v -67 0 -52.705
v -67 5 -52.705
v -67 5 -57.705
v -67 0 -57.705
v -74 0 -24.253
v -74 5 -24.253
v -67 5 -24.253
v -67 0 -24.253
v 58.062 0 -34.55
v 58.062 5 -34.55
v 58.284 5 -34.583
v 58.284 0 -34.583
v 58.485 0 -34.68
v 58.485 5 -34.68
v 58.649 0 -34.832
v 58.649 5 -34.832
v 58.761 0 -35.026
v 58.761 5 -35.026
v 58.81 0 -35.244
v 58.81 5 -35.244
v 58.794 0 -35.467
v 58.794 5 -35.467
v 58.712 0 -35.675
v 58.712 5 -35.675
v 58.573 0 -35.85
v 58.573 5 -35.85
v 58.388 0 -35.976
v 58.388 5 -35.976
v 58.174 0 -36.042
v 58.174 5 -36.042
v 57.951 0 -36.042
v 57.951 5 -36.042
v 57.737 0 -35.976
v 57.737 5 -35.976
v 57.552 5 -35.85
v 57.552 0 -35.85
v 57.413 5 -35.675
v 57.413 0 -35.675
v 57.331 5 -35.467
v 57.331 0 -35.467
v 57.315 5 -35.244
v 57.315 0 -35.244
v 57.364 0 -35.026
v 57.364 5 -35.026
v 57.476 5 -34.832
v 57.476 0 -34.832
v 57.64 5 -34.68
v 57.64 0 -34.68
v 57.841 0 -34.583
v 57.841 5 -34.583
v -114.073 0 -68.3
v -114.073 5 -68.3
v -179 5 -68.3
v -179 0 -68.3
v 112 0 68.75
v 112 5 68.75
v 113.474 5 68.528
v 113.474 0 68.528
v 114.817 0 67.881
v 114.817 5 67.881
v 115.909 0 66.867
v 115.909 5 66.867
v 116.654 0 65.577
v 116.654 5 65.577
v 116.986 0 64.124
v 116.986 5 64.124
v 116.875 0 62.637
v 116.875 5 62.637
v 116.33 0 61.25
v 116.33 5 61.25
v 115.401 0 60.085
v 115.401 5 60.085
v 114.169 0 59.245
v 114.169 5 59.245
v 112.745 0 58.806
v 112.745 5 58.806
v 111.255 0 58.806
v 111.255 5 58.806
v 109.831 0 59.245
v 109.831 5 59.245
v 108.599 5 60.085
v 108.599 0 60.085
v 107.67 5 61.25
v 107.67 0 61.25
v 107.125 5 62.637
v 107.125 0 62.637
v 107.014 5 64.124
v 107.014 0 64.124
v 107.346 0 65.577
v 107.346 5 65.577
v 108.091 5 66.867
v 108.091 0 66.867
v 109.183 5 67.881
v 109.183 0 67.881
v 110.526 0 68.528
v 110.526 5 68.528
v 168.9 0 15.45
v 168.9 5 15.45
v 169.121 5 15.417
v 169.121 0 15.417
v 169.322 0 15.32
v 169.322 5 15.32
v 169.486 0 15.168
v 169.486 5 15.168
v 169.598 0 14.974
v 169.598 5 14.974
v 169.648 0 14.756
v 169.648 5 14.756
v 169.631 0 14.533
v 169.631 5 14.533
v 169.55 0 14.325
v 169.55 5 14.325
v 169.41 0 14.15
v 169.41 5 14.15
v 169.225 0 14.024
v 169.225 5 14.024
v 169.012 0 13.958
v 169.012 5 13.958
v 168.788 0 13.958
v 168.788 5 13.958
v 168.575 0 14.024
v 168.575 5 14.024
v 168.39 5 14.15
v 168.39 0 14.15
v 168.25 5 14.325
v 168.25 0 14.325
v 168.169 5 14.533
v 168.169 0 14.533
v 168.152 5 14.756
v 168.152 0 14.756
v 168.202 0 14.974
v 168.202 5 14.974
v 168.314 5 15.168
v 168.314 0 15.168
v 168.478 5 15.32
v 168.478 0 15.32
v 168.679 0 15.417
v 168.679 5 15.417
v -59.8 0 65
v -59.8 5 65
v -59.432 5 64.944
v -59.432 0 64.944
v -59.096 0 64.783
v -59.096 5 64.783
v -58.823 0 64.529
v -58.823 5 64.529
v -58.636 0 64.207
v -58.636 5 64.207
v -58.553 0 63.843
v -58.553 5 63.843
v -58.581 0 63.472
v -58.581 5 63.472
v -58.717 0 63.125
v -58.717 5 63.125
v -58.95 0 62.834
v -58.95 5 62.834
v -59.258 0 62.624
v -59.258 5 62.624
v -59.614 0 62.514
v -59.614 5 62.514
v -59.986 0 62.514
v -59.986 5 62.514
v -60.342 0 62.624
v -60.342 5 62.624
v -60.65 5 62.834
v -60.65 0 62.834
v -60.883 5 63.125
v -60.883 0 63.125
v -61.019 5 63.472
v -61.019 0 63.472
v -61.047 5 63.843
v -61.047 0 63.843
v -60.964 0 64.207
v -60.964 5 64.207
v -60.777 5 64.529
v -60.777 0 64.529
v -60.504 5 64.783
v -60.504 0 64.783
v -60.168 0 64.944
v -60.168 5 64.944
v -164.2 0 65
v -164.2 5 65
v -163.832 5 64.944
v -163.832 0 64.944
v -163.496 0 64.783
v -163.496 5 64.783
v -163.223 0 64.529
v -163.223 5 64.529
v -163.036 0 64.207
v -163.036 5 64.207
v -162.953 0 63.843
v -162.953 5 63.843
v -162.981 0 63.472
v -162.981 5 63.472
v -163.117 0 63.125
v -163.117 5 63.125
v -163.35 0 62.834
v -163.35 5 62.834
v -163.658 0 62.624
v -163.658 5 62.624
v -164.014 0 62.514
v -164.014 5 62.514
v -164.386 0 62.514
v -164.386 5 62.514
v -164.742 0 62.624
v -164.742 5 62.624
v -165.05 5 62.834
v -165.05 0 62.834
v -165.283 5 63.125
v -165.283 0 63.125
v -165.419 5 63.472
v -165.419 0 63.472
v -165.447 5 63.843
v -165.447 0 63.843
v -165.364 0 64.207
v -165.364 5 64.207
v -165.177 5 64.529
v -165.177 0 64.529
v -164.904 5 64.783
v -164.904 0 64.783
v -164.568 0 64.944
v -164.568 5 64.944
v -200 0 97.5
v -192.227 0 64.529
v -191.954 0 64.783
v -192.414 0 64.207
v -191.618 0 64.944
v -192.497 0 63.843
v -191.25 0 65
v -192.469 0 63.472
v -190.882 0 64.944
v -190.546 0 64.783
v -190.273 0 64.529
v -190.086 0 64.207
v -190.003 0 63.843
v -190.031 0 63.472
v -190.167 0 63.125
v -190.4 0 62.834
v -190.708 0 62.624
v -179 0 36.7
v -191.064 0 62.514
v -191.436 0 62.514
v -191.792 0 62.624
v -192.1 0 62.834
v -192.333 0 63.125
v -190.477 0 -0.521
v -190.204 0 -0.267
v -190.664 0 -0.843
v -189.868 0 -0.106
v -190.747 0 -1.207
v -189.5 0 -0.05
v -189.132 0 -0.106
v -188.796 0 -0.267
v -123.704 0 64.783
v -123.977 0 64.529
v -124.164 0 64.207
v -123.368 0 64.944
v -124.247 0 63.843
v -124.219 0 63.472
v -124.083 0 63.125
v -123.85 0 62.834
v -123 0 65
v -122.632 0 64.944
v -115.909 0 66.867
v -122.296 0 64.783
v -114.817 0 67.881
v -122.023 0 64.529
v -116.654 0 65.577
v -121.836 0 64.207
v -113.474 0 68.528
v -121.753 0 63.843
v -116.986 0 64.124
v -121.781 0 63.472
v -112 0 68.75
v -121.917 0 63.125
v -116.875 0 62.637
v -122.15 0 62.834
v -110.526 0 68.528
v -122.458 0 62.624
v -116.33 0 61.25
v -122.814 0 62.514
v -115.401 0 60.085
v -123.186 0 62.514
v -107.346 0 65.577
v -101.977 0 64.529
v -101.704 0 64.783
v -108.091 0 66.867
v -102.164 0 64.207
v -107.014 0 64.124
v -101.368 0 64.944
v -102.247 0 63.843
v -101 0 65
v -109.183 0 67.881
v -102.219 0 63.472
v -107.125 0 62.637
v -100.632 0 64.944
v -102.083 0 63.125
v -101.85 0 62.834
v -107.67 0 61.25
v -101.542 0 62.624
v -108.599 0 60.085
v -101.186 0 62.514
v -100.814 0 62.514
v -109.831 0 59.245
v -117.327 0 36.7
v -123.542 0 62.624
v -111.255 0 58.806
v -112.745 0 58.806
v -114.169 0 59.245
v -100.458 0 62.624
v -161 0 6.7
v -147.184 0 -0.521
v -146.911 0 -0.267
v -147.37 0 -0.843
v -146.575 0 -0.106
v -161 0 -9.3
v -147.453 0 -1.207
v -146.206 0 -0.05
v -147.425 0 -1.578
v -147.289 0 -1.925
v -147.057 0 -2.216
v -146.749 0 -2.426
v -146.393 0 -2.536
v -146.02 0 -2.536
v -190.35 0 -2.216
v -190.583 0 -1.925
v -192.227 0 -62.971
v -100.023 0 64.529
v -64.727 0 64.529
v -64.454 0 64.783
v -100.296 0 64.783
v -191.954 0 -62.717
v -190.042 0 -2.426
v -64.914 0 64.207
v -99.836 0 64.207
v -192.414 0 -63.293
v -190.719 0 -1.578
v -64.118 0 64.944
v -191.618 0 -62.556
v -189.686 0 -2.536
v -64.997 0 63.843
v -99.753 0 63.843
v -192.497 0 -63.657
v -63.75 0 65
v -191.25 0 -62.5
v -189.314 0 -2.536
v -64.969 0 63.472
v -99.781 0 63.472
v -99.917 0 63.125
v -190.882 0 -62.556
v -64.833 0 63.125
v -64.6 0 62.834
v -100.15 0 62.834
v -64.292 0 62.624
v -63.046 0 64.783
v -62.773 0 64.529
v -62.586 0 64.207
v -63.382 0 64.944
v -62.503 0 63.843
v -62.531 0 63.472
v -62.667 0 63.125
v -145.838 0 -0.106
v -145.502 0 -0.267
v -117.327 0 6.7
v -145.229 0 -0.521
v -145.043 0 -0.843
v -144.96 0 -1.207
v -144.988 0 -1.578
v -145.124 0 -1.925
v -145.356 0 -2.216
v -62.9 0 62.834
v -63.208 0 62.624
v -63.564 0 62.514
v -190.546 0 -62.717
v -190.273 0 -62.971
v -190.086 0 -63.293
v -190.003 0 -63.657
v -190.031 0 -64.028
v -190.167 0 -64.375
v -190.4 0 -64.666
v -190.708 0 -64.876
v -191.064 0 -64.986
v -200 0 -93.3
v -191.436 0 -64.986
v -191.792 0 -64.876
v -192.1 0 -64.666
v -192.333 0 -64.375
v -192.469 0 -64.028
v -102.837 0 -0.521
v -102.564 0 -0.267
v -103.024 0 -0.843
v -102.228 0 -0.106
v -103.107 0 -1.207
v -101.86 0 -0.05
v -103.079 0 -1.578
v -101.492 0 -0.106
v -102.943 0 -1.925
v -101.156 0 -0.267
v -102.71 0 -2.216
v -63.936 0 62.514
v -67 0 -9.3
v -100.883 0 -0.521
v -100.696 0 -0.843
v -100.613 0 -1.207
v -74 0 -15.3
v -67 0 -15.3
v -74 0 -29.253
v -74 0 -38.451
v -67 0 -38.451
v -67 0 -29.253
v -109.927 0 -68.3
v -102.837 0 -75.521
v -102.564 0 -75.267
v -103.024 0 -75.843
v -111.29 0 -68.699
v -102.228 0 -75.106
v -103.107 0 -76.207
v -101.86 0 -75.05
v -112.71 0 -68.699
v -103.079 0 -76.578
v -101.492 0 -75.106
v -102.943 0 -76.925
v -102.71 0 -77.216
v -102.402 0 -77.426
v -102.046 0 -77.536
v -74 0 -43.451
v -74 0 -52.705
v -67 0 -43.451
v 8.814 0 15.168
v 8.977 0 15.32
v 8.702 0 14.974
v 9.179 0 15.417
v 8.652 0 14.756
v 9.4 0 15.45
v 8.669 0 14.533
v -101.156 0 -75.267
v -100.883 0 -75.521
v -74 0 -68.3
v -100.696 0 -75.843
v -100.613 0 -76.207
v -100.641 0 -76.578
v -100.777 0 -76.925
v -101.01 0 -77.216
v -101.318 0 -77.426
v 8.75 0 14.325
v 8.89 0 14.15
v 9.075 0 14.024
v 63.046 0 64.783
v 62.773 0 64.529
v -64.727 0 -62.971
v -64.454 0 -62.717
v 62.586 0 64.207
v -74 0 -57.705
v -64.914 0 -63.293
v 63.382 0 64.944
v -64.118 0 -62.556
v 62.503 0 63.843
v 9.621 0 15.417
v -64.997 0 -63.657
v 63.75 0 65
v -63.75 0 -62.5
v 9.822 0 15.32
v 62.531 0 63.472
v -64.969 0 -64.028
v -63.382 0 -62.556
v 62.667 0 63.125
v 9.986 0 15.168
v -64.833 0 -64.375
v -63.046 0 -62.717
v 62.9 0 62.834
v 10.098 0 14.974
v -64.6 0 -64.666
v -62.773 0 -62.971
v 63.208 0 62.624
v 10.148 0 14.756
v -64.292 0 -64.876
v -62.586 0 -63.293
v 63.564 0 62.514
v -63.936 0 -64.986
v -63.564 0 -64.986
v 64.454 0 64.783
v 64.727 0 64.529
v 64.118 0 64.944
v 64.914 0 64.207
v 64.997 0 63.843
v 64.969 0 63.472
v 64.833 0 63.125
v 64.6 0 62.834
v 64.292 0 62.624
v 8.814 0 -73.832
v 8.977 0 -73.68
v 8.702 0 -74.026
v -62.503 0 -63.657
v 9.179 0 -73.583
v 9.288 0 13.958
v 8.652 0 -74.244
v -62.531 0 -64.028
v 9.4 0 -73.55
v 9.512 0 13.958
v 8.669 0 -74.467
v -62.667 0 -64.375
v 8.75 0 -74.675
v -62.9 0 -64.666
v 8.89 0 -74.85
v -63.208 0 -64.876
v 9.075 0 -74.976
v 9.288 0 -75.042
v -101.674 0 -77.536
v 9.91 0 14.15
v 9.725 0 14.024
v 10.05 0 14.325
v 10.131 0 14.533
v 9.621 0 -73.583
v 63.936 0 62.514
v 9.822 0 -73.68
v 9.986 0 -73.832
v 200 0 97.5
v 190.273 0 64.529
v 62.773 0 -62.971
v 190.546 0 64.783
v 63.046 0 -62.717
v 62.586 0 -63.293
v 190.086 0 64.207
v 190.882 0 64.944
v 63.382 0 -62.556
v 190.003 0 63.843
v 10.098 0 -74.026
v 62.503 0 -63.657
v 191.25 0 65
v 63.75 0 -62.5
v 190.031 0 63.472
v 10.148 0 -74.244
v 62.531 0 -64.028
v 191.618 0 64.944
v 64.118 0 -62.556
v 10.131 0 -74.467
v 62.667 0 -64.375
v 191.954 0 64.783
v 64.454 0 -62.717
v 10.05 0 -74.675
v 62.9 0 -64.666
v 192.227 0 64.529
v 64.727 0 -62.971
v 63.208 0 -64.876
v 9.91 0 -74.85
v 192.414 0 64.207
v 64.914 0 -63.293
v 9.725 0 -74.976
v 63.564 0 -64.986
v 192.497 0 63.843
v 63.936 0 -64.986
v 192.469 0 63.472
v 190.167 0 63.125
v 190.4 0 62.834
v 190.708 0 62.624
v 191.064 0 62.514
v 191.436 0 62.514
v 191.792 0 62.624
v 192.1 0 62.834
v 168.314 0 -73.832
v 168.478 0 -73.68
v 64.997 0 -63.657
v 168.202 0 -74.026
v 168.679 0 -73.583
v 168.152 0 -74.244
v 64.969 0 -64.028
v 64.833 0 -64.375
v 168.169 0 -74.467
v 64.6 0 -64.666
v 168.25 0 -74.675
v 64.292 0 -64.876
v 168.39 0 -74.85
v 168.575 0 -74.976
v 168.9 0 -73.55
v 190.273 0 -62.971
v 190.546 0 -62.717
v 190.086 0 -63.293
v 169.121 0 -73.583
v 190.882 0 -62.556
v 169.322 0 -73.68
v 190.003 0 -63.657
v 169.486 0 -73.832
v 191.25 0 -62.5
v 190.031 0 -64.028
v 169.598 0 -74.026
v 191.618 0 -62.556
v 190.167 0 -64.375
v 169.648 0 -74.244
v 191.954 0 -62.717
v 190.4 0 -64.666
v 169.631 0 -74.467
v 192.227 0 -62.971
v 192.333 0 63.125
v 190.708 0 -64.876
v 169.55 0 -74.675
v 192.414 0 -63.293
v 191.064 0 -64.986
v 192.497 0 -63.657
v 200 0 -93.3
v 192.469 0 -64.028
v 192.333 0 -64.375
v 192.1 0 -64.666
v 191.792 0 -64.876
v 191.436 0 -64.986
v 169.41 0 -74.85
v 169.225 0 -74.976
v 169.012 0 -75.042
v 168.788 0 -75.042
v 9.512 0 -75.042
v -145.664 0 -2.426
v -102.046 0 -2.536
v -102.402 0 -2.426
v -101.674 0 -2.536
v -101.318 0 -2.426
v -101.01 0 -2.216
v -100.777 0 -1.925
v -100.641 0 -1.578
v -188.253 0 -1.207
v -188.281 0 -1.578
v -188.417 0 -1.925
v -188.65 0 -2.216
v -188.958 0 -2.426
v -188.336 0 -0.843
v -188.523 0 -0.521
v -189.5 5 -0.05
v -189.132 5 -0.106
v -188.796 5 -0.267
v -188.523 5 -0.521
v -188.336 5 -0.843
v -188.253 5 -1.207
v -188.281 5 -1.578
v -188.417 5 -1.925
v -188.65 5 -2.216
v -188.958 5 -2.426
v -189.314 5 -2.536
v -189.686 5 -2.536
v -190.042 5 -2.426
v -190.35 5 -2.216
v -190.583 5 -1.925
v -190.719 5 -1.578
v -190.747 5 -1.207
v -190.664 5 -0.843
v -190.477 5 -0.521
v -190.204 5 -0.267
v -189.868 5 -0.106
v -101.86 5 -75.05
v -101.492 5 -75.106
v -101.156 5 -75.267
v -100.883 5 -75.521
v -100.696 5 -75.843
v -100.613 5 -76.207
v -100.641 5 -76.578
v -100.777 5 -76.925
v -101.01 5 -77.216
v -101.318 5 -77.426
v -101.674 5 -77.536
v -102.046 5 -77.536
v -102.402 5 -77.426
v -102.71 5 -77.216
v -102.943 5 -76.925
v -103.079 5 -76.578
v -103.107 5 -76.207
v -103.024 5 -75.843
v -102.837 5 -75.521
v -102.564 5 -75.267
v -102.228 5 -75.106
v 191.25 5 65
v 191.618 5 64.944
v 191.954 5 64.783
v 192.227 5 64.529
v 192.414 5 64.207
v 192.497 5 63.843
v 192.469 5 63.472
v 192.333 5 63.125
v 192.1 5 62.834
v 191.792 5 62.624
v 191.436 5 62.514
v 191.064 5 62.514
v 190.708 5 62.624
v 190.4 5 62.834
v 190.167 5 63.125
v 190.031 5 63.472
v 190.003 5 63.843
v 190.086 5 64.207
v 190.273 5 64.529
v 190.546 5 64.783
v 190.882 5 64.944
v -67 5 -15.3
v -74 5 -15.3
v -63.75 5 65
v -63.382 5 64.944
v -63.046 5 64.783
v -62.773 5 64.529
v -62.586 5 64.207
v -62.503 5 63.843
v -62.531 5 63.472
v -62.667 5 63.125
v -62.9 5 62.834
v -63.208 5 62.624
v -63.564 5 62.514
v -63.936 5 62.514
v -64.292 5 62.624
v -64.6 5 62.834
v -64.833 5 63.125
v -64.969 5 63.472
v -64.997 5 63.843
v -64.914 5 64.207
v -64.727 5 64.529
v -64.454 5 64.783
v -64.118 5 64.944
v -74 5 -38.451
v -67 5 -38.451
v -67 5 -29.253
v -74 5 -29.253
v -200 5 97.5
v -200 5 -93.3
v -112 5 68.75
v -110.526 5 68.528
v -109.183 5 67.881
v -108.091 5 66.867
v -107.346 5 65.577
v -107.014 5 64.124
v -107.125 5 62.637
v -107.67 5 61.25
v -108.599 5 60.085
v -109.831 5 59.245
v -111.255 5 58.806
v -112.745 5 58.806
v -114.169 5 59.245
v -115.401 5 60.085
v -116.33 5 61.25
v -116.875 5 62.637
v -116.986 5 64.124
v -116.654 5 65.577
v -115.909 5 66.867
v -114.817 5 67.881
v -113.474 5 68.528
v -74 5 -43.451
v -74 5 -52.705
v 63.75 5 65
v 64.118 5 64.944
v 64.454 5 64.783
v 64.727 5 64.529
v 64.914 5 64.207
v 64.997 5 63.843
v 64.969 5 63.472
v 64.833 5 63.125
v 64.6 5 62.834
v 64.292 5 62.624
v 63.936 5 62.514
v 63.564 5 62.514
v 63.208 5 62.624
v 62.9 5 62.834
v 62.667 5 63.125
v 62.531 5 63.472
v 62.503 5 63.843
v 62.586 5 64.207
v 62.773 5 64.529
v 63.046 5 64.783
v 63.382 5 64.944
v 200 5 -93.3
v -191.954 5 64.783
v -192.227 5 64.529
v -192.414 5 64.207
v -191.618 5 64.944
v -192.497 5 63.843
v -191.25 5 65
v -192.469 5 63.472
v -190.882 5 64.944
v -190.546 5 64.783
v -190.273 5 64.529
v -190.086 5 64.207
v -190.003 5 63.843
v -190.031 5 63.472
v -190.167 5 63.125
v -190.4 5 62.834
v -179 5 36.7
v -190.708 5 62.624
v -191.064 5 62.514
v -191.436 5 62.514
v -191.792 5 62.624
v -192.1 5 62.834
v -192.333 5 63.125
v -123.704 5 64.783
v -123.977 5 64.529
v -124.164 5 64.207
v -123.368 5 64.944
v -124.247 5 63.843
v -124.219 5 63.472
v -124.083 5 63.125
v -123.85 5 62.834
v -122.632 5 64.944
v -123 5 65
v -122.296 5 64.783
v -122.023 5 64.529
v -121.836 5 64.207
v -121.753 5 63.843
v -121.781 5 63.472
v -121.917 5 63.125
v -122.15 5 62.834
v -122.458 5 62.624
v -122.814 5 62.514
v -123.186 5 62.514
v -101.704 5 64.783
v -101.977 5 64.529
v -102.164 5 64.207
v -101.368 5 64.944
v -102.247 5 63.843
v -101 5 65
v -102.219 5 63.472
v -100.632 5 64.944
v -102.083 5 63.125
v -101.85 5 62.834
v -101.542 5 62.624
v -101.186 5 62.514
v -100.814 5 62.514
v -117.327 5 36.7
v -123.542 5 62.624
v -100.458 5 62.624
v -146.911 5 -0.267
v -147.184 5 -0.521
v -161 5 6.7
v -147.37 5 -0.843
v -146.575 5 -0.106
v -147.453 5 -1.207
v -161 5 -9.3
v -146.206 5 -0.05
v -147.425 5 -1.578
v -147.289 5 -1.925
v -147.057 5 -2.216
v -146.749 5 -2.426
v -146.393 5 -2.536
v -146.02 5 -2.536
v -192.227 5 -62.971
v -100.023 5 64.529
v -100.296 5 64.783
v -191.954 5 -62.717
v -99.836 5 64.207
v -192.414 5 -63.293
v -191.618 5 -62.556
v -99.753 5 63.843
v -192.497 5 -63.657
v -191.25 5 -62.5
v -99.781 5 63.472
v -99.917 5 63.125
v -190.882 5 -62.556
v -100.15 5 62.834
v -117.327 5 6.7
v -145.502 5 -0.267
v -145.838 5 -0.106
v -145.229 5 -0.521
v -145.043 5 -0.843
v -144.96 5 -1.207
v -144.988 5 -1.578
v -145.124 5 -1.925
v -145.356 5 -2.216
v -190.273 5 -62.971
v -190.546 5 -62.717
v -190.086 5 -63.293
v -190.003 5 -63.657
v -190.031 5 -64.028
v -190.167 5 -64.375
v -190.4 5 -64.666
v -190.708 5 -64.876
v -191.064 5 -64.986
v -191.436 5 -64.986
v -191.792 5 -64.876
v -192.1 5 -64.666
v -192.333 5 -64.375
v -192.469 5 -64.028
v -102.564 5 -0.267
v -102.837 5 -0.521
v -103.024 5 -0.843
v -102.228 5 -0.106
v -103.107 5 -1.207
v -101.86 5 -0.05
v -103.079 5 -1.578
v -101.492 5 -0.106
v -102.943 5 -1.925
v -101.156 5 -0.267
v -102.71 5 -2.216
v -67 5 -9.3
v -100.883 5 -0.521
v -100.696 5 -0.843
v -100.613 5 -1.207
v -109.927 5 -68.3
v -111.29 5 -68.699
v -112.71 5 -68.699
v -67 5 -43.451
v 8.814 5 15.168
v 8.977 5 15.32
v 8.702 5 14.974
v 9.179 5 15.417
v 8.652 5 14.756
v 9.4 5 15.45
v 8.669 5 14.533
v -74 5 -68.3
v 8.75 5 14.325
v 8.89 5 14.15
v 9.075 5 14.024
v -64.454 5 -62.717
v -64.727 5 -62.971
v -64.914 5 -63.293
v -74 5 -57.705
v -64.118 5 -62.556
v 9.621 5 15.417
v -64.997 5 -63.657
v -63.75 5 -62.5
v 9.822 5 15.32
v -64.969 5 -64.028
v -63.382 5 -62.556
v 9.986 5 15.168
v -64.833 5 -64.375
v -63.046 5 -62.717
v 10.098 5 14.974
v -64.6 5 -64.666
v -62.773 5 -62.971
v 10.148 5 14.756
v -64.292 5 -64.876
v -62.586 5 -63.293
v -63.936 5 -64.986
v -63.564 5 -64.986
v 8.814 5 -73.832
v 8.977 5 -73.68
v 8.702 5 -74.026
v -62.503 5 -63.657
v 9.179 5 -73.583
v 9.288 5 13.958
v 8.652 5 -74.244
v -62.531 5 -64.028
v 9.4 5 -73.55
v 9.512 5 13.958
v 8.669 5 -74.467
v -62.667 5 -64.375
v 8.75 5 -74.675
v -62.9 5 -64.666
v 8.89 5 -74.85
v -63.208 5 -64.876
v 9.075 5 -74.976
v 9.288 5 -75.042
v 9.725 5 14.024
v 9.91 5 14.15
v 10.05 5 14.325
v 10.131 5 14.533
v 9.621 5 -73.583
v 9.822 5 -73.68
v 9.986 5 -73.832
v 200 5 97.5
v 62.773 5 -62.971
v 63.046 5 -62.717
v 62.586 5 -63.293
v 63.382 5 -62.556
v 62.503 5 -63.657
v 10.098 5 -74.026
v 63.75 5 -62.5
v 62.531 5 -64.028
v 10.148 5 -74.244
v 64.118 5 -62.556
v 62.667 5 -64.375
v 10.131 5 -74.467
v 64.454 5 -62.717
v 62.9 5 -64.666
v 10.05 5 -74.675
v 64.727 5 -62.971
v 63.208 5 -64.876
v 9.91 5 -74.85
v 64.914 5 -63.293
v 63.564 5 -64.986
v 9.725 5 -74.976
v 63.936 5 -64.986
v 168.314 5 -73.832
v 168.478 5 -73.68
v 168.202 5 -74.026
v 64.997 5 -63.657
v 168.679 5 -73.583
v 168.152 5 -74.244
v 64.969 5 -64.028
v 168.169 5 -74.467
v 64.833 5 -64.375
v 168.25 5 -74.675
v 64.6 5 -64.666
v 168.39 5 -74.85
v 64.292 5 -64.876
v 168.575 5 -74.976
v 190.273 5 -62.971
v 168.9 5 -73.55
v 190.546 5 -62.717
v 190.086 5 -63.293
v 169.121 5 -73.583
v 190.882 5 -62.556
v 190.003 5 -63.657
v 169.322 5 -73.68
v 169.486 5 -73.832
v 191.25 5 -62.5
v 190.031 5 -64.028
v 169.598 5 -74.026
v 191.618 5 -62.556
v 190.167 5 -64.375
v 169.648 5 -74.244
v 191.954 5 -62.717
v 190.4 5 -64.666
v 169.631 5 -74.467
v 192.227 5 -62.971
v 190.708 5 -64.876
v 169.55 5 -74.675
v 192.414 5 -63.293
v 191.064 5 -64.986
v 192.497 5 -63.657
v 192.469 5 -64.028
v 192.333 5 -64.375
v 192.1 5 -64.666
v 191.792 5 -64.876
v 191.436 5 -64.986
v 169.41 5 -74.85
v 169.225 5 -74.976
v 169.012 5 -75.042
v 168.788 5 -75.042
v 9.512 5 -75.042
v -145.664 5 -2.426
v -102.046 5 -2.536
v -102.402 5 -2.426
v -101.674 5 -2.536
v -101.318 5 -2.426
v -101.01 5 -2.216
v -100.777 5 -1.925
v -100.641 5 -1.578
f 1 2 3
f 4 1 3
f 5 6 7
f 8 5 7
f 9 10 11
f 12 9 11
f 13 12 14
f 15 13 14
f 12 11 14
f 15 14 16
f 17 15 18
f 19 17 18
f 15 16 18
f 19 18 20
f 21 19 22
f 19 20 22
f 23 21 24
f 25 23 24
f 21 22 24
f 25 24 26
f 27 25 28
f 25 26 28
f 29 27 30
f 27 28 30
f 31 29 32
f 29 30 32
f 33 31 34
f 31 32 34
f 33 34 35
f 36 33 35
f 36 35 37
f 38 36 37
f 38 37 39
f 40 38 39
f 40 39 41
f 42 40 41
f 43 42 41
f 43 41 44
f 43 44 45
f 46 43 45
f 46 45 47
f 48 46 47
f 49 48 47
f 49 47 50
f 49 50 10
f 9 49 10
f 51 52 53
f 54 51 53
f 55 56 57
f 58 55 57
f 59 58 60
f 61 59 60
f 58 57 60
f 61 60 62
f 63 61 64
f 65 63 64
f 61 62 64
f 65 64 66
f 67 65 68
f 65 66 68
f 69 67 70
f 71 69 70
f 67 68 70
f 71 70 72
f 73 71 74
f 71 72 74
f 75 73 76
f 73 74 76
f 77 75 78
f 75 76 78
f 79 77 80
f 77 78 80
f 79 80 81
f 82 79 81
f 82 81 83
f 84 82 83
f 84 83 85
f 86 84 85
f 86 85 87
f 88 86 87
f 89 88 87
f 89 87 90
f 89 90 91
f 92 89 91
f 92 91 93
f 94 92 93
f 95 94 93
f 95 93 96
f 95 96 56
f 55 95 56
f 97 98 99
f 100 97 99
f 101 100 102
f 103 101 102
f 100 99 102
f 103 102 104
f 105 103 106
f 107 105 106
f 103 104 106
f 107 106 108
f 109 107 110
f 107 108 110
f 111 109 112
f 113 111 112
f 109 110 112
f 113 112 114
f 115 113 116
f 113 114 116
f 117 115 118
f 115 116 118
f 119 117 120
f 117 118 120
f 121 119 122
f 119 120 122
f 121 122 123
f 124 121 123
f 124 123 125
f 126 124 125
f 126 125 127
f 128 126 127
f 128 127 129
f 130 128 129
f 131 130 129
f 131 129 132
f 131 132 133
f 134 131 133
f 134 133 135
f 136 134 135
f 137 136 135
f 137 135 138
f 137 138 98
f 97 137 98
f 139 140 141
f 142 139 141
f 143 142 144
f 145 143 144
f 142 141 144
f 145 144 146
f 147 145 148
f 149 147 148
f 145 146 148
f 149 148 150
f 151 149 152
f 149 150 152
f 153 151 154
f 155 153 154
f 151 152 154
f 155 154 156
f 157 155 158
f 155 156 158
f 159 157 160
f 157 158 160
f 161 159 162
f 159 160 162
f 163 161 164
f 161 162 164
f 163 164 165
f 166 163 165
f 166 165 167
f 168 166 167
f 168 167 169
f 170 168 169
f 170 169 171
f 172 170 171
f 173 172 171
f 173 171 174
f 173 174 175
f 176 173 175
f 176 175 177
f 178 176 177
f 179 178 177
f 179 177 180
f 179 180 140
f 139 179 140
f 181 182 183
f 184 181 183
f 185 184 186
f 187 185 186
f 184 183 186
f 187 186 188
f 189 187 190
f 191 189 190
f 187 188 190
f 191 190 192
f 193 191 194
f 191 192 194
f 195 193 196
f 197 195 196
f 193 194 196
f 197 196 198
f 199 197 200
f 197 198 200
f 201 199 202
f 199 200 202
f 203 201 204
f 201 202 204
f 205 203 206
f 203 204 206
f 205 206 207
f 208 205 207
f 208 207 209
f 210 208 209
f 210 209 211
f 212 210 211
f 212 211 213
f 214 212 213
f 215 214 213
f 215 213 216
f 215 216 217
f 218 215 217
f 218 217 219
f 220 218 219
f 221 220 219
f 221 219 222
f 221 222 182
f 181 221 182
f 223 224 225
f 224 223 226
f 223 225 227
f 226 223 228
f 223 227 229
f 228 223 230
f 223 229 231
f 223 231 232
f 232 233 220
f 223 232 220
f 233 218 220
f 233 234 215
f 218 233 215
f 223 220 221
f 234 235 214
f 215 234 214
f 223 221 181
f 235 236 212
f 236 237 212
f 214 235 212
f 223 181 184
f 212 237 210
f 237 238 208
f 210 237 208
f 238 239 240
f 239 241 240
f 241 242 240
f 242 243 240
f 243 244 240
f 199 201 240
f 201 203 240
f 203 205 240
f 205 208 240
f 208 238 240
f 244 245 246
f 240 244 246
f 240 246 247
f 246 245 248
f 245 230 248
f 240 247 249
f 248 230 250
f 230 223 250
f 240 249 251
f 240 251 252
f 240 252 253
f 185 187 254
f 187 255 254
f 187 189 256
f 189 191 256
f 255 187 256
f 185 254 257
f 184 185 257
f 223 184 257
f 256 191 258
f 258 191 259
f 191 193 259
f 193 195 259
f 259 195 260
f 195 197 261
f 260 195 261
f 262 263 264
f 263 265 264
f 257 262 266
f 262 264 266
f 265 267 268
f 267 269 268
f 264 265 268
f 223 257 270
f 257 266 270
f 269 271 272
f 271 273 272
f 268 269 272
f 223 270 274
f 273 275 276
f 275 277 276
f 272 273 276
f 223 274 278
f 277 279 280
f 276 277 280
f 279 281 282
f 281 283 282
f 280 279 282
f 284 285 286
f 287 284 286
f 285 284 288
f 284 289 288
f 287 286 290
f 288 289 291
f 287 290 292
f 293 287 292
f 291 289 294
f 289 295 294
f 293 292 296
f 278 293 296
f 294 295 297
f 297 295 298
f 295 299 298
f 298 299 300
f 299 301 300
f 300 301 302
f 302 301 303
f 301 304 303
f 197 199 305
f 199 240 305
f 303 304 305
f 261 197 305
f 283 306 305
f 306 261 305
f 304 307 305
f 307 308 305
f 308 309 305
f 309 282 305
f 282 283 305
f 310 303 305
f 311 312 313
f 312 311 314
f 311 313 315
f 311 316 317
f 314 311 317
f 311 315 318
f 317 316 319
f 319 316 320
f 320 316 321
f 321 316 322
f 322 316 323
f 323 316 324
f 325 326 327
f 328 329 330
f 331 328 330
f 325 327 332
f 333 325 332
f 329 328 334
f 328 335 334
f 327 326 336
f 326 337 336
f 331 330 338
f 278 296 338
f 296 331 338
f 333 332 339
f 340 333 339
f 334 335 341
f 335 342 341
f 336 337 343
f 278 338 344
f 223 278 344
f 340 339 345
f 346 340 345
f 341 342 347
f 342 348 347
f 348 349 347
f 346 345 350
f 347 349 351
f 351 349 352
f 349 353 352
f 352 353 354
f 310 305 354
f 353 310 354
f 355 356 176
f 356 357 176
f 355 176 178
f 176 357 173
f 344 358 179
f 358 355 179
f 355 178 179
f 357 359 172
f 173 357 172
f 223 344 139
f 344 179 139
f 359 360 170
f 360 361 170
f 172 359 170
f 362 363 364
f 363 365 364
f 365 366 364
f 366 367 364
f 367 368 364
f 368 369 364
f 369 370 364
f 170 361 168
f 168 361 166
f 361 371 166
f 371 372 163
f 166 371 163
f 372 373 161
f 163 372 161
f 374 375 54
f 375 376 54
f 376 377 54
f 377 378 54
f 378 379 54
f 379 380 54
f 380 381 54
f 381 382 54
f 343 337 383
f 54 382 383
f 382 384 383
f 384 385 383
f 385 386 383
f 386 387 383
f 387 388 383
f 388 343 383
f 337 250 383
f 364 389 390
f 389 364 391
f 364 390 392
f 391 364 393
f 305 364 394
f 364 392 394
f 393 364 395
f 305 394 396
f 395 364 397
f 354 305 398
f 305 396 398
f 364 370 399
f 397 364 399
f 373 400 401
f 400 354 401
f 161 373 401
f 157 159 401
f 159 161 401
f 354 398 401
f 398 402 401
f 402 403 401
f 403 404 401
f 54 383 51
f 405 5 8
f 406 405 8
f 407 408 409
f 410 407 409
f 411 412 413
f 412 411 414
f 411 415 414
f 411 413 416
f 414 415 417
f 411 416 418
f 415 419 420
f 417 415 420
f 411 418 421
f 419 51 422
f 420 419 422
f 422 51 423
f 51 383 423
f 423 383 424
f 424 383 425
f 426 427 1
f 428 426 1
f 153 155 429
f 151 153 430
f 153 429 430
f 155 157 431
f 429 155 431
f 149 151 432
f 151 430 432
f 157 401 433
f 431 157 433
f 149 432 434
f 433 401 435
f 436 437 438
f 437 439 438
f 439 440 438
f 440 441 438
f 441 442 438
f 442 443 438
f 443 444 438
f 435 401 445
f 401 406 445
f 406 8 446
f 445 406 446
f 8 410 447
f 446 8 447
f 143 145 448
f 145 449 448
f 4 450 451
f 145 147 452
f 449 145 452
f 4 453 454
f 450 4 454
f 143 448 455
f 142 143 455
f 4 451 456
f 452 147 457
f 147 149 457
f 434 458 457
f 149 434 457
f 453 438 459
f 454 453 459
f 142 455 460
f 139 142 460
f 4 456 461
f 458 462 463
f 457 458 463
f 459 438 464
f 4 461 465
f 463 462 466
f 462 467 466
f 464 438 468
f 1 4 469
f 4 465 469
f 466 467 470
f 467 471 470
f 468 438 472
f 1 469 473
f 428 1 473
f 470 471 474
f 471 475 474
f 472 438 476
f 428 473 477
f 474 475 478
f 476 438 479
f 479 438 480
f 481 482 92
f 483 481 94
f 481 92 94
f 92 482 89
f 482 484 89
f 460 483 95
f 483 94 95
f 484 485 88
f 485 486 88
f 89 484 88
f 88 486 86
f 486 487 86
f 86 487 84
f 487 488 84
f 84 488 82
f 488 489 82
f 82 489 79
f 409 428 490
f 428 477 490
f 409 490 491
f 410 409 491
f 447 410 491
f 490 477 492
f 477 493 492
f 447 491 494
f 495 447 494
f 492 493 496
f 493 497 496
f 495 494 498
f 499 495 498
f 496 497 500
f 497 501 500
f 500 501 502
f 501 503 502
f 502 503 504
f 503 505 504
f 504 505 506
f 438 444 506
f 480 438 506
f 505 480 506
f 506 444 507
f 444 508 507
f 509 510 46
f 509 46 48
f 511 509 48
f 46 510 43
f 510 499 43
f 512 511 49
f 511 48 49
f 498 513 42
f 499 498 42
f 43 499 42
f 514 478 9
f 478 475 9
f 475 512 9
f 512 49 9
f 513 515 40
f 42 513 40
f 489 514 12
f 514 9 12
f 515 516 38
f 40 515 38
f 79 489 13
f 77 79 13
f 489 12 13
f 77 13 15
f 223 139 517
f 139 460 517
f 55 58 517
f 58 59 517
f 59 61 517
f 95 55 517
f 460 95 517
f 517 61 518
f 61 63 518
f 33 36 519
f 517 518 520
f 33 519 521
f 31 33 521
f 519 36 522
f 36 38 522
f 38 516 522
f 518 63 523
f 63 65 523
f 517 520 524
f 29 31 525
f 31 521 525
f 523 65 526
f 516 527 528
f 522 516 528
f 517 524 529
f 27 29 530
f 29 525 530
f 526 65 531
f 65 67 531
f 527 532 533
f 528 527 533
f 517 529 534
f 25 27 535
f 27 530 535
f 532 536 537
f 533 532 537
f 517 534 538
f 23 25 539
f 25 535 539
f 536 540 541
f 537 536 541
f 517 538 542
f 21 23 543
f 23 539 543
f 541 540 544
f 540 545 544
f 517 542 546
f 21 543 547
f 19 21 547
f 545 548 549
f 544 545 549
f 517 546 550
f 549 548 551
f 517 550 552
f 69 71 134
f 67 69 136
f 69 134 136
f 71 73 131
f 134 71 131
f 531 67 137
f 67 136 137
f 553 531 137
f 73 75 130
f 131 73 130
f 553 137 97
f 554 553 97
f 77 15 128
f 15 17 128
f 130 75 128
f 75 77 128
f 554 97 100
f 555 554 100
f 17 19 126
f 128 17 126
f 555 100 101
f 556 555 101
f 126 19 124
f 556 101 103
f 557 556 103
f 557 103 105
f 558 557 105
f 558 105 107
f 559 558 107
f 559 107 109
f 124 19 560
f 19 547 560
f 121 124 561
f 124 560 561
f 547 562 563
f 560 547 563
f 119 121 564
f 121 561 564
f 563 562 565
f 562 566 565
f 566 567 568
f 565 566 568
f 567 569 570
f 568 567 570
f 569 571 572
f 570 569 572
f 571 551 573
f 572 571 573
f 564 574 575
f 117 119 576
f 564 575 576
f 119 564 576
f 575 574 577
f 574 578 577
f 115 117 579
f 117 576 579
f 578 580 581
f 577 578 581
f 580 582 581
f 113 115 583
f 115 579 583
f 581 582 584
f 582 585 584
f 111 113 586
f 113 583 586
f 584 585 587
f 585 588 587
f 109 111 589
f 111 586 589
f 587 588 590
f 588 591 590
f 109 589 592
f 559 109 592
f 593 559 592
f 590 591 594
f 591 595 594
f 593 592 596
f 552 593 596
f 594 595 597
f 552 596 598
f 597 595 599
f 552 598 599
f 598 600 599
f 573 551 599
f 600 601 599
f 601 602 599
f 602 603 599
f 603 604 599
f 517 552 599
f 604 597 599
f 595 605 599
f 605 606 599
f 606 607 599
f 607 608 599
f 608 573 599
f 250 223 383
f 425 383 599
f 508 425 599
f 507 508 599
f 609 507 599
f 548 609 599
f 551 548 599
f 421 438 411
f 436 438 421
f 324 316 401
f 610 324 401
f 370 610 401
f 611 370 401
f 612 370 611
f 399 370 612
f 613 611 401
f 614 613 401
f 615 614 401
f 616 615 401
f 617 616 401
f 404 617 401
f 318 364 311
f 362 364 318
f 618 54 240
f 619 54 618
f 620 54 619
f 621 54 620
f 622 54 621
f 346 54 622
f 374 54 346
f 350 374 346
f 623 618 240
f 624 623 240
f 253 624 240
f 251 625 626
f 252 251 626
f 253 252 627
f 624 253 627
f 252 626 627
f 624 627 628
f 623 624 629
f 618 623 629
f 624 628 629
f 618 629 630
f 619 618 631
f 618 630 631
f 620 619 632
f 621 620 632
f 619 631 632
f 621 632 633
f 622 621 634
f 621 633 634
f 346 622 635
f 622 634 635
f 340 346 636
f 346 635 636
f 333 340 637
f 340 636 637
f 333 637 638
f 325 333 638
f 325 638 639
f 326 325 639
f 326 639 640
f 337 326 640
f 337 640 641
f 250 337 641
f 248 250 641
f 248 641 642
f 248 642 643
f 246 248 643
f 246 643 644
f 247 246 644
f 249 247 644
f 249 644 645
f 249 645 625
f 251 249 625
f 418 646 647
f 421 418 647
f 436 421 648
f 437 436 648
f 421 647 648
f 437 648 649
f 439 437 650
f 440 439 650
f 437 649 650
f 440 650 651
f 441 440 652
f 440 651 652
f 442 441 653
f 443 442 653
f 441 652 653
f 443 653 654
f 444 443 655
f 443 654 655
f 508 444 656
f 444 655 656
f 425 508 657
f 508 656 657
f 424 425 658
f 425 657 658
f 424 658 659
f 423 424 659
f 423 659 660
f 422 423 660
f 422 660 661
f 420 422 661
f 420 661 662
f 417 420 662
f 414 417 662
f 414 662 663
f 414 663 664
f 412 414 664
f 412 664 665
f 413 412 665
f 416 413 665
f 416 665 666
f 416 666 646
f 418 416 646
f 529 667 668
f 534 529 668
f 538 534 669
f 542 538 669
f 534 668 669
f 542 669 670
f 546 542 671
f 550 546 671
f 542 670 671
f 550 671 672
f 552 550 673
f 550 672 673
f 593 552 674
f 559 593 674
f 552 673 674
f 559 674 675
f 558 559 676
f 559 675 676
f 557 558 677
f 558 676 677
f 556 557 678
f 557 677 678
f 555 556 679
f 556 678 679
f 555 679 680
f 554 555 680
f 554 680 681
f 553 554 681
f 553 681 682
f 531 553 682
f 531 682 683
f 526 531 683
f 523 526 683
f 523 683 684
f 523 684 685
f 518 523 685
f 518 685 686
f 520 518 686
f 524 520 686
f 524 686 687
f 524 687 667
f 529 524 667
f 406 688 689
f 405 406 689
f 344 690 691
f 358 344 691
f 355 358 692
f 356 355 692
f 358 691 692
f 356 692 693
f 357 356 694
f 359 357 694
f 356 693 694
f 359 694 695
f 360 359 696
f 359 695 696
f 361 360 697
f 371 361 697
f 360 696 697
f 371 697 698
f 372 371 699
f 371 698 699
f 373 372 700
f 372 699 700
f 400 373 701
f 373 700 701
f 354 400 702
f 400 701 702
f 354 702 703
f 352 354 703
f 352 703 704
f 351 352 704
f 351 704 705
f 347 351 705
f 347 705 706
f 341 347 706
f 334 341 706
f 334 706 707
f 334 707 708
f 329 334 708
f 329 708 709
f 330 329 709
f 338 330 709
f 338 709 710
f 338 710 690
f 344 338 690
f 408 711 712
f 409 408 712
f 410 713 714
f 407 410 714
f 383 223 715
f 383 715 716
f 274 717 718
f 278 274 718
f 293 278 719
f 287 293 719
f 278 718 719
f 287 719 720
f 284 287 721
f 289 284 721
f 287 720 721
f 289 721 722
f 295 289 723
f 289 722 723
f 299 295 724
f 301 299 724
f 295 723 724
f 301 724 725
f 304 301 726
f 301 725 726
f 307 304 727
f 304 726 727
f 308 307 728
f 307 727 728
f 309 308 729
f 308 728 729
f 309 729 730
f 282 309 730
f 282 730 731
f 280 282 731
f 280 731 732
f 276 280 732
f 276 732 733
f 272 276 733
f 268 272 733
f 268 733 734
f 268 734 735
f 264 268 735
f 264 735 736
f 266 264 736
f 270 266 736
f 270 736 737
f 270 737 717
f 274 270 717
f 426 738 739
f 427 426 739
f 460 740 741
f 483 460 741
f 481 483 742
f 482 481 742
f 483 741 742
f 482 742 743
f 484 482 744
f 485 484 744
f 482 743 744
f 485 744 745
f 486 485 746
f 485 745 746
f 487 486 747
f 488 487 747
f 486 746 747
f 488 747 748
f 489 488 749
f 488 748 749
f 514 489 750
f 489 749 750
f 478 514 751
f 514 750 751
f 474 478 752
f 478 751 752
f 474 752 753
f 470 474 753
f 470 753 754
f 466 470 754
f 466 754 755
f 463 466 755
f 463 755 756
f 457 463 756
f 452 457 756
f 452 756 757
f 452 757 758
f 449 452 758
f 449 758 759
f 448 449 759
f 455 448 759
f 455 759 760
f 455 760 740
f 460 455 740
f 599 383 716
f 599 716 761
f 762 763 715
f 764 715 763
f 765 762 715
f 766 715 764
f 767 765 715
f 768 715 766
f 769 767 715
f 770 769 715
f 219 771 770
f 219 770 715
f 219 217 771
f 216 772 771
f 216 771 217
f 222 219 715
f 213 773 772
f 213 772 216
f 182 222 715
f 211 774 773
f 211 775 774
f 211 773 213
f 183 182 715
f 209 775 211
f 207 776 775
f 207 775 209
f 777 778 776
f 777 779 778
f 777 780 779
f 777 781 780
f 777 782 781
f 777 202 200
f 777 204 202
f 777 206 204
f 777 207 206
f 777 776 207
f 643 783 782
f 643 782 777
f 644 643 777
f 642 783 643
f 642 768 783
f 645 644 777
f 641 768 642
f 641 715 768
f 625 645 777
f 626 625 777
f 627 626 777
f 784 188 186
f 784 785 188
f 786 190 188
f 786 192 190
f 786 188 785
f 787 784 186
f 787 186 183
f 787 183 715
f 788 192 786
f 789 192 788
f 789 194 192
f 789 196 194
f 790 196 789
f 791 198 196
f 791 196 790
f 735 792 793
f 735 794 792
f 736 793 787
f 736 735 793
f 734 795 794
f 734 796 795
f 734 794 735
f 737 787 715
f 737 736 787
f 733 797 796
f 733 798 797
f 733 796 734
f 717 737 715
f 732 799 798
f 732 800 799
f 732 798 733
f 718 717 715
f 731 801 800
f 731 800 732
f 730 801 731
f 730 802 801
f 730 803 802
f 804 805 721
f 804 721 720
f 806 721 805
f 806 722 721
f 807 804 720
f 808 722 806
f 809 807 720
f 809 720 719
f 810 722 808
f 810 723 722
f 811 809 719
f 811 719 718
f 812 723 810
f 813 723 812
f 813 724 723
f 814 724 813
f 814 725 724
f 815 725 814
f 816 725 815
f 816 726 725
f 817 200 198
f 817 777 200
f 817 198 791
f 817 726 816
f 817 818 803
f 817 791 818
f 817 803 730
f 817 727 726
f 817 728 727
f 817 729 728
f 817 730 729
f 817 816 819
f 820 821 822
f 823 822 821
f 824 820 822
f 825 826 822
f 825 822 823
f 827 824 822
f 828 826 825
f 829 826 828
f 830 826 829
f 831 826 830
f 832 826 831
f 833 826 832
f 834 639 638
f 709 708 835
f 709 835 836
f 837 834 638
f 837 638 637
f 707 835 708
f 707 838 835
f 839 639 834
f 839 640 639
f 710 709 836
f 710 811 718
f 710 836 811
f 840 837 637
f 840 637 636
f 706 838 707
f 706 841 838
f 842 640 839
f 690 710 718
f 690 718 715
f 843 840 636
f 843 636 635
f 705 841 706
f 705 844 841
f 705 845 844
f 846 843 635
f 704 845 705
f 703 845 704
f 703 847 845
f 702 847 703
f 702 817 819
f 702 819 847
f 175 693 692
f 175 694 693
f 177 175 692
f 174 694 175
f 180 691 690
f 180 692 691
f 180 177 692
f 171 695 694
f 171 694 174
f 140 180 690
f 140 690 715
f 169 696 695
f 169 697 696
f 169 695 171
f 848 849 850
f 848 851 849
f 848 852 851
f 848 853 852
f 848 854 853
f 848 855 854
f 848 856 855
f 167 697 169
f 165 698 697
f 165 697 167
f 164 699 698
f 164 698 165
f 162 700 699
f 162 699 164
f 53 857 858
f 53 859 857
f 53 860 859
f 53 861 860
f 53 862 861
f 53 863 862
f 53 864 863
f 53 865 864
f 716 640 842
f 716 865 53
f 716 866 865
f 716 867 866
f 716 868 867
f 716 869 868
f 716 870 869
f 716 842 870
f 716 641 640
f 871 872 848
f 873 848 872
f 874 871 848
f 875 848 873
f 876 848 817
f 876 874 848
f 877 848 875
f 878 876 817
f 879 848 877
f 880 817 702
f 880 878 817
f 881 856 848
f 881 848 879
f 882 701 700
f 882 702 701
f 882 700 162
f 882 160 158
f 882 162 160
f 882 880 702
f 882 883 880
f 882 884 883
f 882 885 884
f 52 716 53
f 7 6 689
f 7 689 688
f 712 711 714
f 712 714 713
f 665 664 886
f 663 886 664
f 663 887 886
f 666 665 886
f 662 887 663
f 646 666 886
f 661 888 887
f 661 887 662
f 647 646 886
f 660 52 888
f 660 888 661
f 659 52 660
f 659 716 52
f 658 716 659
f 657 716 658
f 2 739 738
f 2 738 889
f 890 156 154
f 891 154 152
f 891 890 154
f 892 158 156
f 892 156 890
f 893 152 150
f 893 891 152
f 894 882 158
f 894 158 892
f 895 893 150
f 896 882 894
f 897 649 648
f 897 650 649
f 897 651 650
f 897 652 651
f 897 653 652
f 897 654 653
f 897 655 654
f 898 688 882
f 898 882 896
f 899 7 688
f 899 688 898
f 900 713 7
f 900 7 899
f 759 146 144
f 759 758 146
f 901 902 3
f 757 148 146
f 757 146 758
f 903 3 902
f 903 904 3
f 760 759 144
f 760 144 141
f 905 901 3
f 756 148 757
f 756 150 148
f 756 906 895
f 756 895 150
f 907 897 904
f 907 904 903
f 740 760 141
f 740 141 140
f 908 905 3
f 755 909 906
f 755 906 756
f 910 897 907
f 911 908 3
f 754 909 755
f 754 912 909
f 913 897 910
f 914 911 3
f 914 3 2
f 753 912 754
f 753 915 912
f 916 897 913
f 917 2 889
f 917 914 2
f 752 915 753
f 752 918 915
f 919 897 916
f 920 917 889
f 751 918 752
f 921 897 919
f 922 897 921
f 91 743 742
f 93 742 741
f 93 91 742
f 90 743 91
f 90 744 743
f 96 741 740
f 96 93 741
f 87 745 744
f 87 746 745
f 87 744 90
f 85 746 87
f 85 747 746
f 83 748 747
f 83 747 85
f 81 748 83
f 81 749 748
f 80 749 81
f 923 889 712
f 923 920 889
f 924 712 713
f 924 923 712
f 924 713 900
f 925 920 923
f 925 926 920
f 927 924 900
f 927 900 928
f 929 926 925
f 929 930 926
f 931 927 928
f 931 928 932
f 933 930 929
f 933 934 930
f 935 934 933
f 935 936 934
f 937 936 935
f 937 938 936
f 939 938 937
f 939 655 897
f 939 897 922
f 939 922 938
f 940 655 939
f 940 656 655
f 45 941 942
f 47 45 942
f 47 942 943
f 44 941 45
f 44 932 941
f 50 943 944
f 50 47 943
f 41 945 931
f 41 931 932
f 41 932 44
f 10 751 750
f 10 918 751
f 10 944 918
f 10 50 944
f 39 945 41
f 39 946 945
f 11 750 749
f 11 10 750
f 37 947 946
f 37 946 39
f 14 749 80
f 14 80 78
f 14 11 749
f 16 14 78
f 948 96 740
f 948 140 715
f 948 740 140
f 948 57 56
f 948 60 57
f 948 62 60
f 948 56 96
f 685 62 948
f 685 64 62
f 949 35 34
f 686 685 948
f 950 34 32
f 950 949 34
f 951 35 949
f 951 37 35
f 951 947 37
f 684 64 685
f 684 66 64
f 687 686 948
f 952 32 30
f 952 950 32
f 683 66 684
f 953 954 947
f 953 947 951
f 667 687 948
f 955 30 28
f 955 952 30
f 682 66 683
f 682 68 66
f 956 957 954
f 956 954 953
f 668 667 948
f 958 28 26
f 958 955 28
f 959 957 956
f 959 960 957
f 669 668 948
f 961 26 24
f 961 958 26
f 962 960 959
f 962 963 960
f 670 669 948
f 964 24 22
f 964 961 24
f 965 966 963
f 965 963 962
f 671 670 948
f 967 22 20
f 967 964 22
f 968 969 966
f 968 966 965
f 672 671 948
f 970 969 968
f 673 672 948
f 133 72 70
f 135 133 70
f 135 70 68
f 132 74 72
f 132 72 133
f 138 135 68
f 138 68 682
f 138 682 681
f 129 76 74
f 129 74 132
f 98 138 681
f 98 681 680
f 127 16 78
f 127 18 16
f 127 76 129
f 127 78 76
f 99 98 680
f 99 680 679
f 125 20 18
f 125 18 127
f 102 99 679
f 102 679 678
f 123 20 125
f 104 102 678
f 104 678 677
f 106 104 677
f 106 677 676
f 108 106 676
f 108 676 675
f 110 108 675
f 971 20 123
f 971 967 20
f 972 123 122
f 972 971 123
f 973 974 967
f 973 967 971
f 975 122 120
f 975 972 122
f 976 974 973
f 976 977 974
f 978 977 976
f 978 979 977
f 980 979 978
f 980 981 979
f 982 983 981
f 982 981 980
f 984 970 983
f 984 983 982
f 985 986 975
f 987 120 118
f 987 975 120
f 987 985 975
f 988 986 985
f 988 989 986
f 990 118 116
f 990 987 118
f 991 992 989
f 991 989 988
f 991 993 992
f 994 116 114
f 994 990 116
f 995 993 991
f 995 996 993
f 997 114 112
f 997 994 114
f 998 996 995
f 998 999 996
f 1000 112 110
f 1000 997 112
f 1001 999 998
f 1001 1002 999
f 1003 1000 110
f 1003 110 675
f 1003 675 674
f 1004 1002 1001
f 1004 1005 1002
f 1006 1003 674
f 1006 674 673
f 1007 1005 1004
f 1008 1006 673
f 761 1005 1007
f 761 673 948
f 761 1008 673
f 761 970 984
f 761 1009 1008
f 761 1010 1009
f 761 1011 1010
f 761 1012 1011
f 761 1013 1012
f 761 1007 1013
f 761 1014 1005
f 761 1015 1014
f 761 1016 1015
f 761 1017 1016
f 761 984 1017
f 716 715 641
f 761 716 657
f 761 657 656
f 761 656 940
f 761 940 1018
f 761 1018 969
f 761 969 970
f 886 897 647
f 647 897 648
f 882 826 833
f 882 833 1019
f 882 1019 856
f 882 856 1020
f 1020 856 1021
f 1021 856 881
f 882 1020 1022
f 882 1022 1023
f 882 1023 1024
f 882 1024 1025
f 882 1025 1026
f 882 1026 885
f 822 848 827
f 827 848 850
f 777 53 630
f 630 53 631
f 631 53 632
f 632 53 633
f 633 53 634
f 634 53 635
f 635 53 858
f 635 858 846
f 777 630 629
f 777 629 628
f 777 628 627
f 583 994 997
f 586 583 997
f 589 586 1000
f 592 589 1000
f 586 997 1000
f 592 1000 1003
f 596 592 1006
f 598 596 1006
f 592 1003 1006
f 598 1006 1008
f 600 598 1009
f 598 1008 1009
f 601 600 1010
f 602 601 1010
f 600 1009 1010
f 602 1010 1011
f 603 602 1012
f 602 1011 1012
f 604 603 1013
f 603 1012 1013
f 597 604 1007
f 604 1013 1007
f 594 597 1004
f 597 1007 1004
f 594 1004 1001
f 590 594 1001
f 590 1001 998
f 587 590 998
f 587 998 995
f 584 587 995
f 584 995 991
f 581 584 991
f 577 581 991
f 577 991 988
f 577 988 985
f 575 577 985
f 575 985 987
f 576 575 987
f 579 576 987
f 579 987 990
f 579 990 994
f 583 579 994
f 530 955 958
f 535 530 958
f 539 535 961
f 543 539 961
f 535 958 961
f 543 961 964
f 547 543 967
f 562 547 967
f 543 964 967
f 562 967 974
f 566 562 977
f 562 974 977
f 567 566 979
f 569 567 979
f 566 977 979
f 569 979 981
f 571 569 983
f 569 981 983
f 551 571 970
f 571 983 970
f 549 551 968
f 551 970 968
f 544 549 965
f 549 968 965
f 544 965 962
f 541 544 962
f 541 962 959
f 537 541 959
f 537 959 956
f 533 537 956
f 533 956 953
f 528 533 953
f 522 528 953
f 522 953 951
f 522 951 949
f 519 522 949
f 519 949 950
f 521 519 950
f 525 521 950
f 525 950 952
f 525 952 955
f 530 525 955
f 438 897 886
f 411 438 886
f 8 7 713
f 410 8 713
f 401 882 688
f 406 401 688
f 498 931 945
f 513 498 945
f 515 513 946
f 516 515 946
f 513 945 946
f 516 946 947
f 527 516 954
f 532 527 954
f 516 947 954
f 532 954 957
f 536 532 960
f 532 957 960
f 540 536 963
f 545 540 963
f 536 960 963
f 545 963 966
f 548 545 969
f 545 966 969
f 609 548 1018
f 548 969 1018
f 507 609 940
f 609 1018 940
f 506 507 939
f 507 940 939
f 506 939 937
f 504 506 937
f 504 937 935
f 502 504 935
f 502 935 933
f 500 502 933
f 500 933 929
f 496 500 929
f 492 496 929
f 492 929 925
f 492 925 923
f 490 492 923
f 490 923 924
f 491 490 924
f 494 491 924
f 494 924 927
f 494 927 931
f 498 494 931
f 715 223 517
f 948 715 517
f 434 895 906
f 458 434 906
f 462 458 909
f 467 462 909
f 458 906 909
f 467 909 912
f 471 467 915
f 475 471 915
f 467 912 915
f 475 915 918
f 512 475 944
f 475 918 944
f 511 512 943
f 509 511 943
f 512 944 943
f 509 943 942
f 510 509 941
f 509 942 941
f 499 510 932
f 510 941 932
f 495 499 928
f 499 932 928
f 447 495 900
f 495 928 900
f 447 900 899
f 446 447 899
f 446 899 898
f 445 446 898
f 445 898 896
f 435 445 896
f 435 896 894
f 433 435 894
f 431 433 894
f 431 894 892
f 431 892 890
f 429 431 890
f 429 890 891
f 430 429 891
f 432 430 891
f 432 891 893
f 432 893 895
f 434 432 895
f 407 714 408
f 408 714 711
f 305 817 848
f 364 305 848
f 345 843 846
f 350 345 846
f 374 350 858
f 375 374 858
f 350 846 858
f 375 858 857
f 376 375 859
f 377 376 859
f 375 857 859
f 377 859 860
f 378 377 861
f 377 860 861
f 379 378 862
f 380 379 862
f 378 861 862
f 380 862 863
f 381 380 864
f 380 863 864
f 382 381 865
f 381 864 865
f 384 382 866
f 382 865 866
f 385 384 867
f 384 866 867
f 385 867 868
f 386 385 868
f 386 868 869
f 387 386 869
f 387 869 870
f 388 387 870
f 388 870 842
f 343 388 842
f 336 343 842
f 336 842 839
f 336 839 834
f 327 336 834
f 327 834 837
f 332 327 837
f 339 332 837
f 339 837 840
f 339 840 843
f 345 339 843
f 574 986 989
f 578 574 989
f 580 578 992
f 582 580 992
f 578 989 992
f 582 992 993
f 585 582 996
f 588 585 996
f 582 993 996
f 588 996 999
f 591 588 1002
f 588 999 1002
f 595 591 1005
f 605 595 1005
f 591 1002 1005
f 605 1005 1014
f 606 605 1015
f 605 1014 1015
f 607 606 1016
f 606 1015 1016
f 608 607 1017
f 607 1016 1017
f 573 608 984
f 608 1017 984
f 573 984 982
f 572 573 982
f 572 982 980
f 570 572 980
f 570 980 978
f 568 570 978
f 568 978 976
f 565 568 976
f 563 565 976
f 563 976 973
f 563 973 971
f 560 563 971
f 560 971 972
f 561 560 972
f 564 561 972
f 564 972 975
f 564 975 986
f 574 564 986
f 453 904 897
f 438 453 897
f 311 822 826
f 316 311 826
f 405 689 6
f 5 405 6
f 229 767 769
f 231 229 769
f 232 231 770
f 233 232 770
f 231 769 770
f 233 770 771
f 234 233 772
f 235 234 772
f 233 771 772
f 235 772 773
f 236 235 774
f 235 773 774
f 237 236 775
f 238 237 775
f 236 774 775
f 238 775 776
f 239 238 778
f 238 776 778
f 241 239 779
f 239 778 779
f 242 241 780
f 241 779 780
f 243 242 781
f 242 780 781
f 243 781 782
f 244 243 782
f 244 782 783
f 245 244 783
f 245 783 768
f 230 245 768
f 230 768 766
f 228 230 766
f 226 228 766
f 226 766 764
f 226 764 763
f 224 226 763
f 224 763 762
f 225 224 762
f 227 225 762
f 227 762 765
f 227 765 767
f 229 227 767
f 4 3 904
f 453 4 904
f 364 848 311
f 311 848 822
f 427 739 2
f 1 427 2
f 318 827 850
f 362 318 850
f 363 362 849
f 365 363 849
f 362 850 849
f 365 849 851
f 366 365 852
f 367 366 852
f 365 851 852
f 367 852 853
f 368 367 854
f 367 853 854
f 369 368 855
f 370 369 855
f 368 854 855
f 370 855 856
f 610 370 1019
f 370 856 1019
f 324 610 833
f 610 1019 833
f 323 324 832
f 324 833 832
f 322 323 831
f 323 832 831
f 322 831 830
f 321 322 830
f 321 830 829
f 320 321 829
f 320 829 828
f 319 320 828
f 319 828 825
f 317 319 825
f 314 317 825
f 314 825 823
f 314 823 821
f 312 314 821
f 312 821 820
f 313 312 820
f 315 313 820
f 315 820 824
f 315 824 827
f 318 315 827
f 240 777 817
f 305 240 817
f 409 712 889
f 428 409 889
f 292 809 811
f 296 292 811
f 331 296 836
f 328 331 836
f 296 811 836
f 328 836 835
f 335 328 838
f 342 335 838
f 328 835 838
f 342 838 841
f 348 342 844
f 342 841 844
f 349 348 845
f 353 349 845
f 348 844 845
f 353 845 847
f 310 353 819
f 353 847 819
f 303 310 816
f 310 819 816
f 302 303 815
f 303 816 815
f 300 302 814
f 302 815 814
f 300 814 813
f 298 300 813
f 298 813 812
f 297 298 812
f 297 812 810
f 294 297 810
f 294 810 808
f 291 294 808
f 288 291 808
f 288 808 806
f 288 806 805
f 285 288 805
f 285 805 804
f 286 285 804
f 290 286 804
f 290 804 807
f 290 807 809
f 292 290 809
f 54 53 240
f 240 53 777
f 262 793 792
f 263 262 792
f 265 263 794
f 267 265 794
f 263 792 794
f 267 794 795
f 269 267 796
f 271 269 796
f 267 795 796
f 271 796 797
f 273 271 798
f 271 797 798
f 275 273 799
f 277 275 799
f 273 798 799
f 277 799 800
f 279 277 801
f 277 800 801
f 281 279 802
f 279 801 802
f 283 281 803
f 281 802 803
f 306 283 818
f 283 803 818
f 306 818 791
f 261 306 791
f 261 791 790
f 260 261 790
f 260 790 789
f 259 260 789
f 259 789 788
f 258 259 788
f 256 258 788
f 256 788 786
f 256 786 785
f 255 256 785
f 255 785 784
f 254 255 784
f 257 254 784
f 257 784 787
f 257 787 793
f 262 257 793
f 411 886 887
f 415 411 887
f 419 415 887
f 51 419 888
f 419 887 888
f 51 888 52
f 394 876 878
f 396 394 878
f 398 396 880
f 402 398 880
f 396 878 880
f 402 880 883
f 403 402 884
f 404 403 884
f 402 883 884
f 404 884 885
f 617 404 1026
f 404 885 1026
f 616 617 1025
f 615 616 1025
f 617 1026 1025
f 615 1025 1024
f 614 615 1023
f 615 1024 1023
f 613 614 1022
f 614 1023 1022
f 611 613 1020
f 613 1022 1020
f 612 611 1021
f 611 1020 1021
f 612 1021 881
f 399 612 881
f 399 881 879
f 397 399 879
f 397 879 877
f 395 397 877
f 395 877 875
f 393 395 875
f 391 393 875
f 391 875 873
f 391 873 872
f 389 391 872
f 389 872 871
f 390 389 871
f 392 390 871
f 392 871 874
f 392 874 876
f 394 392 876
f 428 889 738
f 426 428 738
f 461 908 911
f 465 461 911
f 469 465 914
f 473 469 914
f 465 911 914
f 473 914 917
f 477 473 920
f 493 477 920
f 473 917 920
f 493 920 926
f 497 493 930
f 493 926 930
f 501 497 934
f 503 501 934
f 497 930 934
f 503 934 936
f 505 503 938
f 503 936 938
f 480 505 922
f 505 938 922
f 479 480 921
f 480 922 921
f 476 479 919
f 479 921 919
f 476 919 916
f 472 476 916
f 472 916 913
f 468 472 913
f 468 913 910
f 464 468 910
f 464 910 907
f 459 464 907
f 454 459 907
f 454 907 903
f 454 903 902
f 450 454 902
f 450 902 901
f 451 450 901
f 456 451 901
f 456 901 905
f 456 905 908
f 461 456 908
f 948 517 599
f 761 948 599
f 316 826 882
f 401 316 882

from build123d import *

# Parameters (mm, degrees)
SKETCH2_W           = 400
SKETCH2_H           = 190.8
BOSS_EXTRUDE1_DEPTH = 5
SKETCH3_R           = 5
CUT_EXTRUDE1_DEPTH  = 223.556172685
SKETCH4_R           = 1.25
CUT_EXTRUDE2_DEPTH  = 223.556172685
CUT_EXTRUDE3_DEPTH  = 223.556172685
SKETCH7_R           = 0.75
CUT_EXTRUDE4_DEPTH  = 223.556172685
SKETCH8_R           = 1.25
CUT_EXTRUDE5_DEPTH  = 10
SKETCH9_R           = 1.25
CUT_EXTRUDE6_DEPTH  = 223.556172685


with BuildPart() as part:
    # Sketch2 → Boss-Extrude1 (new body)
    with BuildSketch(Plane(origin=(0, 0, 0), x_dir=(1, 0, 0), z_dir=(0, 1, 0))):
        with Locations((0, -2.1)):
            Rectangle(SKETCH2_W, SKETCH2_H)
    extrude(amount=BOSS_EXTRUDE1_DEPTH)

    # Sketch3 → Cut-Extrude1 (cut, through all)
    with BuildSketch(Plane(origin=(0, 5, 0), x_dir=(1, 0, 0), z_dir=(0, 1, 0))):
        with Locations(Location((-112, 63.75, 0), (0, 0, 270))):
            Circle(SKETCH3_R)
        with Locations(Location((112, -63.75, 0), (0, 0, 270))):
            Circle(SKETCH3_R)
        with Locations(Location((-112, -63.75, 0), (0, 0, 270))):
            Circle(SKETCH3_R)
    extrude(amount=-CUT_EXTRUDE1_DEPTH, mode=Mode.SUBTRACT)

    # Sketch4 → Cut-Extrude2 (cut, through all)
    with BuildSketch(Plane(origin=(0, 5, 0), x_dir=(1, 0, 0), z_dir=(0, 1, 0))):
        with Locations(Location((-191.25, 63.75, 0), (0, 0, 270))):
            Circle(SKETCH4_R)
        with Locations(Location((-63.75, 63.75, 0), (0, 0, 270))):
            Circle(SKETCH4_R)
        with Locations(Location((63.75, 63.75, 0), (0, 0, 270))):
            Circle(SKETCH4_R)
        with Locations(Location((191.25, 63.75, 0), (0, 0, 270))):
            Circle(SKETCH4_R)
        with Locations(Location((191.25, -63.75, 0), (0, 0, 270))):
            Circle(SKETCH4_R)
        with Locations(Location((63.75, -63.75, 0), (0, 0, 270))):
            Circle(SKETCH4_R)
        with Locations(Location((-63.75, -63.75, 0), (0, 0, 270))):
            Circle(SKETCH4_R)
        with Locations(Location((-191.25, -63.75, 0), (0, 0, 270))):
            Circle(SKETCH4_R)
    extrude(amount=-CUT_EXTRUDE2_DEPTH, mode=Mode.SUBTRACT)

    # Sketch5 → Cut-Extrude3 (cut, through all)
    with BuildSketch(Plane(origin=(0, 5, 0), x_dir=(1, 0, 0), z_dir=(0, 1, 0))):
        Polygon((-179, 68.3), (-179, -36.7), (-117.327189105, -36.7), (-117.327189105, -6.7), (-161, -6.7), (-161, 9.3), (-67, 9.3), (-67, 15.3), (-74, 15.3), (-74, 24.252605128), (-67, 24.252605128), (-67, 29.252605128), (-74, 29.252605128), (-74, 38.451162805), (-67, 38.451162805), (-67, 43.451162805), (-74, 43.451162805), (-74, 52.70528249), (-67, 52.70528249), (-67, 57.70528249), (-74, 57.70528249), (-74, 68.3), (-76.383096774, 68.3), align=None)
    extrude(amount=-CUT_EXTRUDE3_DEPTH, mode=Mode.SUBTRACT)

    # Sketch7 → Cut-Extrude4 (cut, through all)
    with BuildSketch(Plane(origin=(0, 5, 0), x_dir=(1, 0, 0), z_dir=(0, 1, 0))):
        with Locations(Location((9.399984, 74.29999922, 0), (0, 0, 270))):
            Circle(SKETCH7_R)
        with Locations(Location((58.062496917, 35.300001471, 0), (0, 0, 270))):
            Circle(SKETCH7_R)
        with Locations(Location((168.9, 74.29999922, 0), (0, 0, 270))):
            Circle(SKETCH7_R)
        with Locations(Location((168.9, -14.70000278, 0), (0, 0, 270))):
            Circle(SKETCH7_R)
        with Locations(Location((9.399984, -14.70000278, 0), (0, 0, 270))):
            Circle(SKETCH7_R)
    extrude(amount=-CUT_EXTRUDE4_DEPTH, mode=Mode.SUBTRACT)

    # Sketch8 → Cut-Extrude5 (cut)
    with BuildSketch(Plane(origin=(0, 5, 0), x_dir=(1, 0, 0), z_dir=(0, 1, 0))):
        with Locations(Location((-164.2, -63.75, 0), (0, 0, 270))):
            Circle(SKETCH8_R)
        with Locations(Location((-123, -63.75, 0), (0, 0, 270))):
            Circle(SKETCH8_R)
        with Locations(Location((-101, -63.75, 0), (0, 0, 270))):
            Circle(SKETCH8_R)
        with Locations(Location((-59.8, -63.75, 0), (0, 0, 270))):
            Circle(SKETCH8_R)
    extrude(amount=-CUT_EXTRUDE5_DEPTH, mode=Mode.SUBTRACT)

    # Sketch9 → Cut-Extrude6 (cut, through all)
    with BuildSketch(Plane(origin=(0, 5, 0), x_dir=(1, 0, 0), z_dir=(0, 1, 0))):
        with Locations(Location((-189.5, 1.3, 0), (0, 0, 270))):
            Circle(SKETCH9_R)
        with Locations(Location((-146.206430225, 1.3, 0), (0, 0, 270))):
            Circle(SKETCH9_R)
        with Locations(Location((-101.86, 76.3, 0), (0, 0, 270))):
            Circle(SKETCH9_R)
        with Locations(Location((-101.86, 1.3, 0), (0, 0, 270))):
            Circle(SKETCH9_R)
    extrude(amount=-CUT_EXTRUDE6_DEPTH, mode=Mode.SUBTRACT)


solid = part.part
